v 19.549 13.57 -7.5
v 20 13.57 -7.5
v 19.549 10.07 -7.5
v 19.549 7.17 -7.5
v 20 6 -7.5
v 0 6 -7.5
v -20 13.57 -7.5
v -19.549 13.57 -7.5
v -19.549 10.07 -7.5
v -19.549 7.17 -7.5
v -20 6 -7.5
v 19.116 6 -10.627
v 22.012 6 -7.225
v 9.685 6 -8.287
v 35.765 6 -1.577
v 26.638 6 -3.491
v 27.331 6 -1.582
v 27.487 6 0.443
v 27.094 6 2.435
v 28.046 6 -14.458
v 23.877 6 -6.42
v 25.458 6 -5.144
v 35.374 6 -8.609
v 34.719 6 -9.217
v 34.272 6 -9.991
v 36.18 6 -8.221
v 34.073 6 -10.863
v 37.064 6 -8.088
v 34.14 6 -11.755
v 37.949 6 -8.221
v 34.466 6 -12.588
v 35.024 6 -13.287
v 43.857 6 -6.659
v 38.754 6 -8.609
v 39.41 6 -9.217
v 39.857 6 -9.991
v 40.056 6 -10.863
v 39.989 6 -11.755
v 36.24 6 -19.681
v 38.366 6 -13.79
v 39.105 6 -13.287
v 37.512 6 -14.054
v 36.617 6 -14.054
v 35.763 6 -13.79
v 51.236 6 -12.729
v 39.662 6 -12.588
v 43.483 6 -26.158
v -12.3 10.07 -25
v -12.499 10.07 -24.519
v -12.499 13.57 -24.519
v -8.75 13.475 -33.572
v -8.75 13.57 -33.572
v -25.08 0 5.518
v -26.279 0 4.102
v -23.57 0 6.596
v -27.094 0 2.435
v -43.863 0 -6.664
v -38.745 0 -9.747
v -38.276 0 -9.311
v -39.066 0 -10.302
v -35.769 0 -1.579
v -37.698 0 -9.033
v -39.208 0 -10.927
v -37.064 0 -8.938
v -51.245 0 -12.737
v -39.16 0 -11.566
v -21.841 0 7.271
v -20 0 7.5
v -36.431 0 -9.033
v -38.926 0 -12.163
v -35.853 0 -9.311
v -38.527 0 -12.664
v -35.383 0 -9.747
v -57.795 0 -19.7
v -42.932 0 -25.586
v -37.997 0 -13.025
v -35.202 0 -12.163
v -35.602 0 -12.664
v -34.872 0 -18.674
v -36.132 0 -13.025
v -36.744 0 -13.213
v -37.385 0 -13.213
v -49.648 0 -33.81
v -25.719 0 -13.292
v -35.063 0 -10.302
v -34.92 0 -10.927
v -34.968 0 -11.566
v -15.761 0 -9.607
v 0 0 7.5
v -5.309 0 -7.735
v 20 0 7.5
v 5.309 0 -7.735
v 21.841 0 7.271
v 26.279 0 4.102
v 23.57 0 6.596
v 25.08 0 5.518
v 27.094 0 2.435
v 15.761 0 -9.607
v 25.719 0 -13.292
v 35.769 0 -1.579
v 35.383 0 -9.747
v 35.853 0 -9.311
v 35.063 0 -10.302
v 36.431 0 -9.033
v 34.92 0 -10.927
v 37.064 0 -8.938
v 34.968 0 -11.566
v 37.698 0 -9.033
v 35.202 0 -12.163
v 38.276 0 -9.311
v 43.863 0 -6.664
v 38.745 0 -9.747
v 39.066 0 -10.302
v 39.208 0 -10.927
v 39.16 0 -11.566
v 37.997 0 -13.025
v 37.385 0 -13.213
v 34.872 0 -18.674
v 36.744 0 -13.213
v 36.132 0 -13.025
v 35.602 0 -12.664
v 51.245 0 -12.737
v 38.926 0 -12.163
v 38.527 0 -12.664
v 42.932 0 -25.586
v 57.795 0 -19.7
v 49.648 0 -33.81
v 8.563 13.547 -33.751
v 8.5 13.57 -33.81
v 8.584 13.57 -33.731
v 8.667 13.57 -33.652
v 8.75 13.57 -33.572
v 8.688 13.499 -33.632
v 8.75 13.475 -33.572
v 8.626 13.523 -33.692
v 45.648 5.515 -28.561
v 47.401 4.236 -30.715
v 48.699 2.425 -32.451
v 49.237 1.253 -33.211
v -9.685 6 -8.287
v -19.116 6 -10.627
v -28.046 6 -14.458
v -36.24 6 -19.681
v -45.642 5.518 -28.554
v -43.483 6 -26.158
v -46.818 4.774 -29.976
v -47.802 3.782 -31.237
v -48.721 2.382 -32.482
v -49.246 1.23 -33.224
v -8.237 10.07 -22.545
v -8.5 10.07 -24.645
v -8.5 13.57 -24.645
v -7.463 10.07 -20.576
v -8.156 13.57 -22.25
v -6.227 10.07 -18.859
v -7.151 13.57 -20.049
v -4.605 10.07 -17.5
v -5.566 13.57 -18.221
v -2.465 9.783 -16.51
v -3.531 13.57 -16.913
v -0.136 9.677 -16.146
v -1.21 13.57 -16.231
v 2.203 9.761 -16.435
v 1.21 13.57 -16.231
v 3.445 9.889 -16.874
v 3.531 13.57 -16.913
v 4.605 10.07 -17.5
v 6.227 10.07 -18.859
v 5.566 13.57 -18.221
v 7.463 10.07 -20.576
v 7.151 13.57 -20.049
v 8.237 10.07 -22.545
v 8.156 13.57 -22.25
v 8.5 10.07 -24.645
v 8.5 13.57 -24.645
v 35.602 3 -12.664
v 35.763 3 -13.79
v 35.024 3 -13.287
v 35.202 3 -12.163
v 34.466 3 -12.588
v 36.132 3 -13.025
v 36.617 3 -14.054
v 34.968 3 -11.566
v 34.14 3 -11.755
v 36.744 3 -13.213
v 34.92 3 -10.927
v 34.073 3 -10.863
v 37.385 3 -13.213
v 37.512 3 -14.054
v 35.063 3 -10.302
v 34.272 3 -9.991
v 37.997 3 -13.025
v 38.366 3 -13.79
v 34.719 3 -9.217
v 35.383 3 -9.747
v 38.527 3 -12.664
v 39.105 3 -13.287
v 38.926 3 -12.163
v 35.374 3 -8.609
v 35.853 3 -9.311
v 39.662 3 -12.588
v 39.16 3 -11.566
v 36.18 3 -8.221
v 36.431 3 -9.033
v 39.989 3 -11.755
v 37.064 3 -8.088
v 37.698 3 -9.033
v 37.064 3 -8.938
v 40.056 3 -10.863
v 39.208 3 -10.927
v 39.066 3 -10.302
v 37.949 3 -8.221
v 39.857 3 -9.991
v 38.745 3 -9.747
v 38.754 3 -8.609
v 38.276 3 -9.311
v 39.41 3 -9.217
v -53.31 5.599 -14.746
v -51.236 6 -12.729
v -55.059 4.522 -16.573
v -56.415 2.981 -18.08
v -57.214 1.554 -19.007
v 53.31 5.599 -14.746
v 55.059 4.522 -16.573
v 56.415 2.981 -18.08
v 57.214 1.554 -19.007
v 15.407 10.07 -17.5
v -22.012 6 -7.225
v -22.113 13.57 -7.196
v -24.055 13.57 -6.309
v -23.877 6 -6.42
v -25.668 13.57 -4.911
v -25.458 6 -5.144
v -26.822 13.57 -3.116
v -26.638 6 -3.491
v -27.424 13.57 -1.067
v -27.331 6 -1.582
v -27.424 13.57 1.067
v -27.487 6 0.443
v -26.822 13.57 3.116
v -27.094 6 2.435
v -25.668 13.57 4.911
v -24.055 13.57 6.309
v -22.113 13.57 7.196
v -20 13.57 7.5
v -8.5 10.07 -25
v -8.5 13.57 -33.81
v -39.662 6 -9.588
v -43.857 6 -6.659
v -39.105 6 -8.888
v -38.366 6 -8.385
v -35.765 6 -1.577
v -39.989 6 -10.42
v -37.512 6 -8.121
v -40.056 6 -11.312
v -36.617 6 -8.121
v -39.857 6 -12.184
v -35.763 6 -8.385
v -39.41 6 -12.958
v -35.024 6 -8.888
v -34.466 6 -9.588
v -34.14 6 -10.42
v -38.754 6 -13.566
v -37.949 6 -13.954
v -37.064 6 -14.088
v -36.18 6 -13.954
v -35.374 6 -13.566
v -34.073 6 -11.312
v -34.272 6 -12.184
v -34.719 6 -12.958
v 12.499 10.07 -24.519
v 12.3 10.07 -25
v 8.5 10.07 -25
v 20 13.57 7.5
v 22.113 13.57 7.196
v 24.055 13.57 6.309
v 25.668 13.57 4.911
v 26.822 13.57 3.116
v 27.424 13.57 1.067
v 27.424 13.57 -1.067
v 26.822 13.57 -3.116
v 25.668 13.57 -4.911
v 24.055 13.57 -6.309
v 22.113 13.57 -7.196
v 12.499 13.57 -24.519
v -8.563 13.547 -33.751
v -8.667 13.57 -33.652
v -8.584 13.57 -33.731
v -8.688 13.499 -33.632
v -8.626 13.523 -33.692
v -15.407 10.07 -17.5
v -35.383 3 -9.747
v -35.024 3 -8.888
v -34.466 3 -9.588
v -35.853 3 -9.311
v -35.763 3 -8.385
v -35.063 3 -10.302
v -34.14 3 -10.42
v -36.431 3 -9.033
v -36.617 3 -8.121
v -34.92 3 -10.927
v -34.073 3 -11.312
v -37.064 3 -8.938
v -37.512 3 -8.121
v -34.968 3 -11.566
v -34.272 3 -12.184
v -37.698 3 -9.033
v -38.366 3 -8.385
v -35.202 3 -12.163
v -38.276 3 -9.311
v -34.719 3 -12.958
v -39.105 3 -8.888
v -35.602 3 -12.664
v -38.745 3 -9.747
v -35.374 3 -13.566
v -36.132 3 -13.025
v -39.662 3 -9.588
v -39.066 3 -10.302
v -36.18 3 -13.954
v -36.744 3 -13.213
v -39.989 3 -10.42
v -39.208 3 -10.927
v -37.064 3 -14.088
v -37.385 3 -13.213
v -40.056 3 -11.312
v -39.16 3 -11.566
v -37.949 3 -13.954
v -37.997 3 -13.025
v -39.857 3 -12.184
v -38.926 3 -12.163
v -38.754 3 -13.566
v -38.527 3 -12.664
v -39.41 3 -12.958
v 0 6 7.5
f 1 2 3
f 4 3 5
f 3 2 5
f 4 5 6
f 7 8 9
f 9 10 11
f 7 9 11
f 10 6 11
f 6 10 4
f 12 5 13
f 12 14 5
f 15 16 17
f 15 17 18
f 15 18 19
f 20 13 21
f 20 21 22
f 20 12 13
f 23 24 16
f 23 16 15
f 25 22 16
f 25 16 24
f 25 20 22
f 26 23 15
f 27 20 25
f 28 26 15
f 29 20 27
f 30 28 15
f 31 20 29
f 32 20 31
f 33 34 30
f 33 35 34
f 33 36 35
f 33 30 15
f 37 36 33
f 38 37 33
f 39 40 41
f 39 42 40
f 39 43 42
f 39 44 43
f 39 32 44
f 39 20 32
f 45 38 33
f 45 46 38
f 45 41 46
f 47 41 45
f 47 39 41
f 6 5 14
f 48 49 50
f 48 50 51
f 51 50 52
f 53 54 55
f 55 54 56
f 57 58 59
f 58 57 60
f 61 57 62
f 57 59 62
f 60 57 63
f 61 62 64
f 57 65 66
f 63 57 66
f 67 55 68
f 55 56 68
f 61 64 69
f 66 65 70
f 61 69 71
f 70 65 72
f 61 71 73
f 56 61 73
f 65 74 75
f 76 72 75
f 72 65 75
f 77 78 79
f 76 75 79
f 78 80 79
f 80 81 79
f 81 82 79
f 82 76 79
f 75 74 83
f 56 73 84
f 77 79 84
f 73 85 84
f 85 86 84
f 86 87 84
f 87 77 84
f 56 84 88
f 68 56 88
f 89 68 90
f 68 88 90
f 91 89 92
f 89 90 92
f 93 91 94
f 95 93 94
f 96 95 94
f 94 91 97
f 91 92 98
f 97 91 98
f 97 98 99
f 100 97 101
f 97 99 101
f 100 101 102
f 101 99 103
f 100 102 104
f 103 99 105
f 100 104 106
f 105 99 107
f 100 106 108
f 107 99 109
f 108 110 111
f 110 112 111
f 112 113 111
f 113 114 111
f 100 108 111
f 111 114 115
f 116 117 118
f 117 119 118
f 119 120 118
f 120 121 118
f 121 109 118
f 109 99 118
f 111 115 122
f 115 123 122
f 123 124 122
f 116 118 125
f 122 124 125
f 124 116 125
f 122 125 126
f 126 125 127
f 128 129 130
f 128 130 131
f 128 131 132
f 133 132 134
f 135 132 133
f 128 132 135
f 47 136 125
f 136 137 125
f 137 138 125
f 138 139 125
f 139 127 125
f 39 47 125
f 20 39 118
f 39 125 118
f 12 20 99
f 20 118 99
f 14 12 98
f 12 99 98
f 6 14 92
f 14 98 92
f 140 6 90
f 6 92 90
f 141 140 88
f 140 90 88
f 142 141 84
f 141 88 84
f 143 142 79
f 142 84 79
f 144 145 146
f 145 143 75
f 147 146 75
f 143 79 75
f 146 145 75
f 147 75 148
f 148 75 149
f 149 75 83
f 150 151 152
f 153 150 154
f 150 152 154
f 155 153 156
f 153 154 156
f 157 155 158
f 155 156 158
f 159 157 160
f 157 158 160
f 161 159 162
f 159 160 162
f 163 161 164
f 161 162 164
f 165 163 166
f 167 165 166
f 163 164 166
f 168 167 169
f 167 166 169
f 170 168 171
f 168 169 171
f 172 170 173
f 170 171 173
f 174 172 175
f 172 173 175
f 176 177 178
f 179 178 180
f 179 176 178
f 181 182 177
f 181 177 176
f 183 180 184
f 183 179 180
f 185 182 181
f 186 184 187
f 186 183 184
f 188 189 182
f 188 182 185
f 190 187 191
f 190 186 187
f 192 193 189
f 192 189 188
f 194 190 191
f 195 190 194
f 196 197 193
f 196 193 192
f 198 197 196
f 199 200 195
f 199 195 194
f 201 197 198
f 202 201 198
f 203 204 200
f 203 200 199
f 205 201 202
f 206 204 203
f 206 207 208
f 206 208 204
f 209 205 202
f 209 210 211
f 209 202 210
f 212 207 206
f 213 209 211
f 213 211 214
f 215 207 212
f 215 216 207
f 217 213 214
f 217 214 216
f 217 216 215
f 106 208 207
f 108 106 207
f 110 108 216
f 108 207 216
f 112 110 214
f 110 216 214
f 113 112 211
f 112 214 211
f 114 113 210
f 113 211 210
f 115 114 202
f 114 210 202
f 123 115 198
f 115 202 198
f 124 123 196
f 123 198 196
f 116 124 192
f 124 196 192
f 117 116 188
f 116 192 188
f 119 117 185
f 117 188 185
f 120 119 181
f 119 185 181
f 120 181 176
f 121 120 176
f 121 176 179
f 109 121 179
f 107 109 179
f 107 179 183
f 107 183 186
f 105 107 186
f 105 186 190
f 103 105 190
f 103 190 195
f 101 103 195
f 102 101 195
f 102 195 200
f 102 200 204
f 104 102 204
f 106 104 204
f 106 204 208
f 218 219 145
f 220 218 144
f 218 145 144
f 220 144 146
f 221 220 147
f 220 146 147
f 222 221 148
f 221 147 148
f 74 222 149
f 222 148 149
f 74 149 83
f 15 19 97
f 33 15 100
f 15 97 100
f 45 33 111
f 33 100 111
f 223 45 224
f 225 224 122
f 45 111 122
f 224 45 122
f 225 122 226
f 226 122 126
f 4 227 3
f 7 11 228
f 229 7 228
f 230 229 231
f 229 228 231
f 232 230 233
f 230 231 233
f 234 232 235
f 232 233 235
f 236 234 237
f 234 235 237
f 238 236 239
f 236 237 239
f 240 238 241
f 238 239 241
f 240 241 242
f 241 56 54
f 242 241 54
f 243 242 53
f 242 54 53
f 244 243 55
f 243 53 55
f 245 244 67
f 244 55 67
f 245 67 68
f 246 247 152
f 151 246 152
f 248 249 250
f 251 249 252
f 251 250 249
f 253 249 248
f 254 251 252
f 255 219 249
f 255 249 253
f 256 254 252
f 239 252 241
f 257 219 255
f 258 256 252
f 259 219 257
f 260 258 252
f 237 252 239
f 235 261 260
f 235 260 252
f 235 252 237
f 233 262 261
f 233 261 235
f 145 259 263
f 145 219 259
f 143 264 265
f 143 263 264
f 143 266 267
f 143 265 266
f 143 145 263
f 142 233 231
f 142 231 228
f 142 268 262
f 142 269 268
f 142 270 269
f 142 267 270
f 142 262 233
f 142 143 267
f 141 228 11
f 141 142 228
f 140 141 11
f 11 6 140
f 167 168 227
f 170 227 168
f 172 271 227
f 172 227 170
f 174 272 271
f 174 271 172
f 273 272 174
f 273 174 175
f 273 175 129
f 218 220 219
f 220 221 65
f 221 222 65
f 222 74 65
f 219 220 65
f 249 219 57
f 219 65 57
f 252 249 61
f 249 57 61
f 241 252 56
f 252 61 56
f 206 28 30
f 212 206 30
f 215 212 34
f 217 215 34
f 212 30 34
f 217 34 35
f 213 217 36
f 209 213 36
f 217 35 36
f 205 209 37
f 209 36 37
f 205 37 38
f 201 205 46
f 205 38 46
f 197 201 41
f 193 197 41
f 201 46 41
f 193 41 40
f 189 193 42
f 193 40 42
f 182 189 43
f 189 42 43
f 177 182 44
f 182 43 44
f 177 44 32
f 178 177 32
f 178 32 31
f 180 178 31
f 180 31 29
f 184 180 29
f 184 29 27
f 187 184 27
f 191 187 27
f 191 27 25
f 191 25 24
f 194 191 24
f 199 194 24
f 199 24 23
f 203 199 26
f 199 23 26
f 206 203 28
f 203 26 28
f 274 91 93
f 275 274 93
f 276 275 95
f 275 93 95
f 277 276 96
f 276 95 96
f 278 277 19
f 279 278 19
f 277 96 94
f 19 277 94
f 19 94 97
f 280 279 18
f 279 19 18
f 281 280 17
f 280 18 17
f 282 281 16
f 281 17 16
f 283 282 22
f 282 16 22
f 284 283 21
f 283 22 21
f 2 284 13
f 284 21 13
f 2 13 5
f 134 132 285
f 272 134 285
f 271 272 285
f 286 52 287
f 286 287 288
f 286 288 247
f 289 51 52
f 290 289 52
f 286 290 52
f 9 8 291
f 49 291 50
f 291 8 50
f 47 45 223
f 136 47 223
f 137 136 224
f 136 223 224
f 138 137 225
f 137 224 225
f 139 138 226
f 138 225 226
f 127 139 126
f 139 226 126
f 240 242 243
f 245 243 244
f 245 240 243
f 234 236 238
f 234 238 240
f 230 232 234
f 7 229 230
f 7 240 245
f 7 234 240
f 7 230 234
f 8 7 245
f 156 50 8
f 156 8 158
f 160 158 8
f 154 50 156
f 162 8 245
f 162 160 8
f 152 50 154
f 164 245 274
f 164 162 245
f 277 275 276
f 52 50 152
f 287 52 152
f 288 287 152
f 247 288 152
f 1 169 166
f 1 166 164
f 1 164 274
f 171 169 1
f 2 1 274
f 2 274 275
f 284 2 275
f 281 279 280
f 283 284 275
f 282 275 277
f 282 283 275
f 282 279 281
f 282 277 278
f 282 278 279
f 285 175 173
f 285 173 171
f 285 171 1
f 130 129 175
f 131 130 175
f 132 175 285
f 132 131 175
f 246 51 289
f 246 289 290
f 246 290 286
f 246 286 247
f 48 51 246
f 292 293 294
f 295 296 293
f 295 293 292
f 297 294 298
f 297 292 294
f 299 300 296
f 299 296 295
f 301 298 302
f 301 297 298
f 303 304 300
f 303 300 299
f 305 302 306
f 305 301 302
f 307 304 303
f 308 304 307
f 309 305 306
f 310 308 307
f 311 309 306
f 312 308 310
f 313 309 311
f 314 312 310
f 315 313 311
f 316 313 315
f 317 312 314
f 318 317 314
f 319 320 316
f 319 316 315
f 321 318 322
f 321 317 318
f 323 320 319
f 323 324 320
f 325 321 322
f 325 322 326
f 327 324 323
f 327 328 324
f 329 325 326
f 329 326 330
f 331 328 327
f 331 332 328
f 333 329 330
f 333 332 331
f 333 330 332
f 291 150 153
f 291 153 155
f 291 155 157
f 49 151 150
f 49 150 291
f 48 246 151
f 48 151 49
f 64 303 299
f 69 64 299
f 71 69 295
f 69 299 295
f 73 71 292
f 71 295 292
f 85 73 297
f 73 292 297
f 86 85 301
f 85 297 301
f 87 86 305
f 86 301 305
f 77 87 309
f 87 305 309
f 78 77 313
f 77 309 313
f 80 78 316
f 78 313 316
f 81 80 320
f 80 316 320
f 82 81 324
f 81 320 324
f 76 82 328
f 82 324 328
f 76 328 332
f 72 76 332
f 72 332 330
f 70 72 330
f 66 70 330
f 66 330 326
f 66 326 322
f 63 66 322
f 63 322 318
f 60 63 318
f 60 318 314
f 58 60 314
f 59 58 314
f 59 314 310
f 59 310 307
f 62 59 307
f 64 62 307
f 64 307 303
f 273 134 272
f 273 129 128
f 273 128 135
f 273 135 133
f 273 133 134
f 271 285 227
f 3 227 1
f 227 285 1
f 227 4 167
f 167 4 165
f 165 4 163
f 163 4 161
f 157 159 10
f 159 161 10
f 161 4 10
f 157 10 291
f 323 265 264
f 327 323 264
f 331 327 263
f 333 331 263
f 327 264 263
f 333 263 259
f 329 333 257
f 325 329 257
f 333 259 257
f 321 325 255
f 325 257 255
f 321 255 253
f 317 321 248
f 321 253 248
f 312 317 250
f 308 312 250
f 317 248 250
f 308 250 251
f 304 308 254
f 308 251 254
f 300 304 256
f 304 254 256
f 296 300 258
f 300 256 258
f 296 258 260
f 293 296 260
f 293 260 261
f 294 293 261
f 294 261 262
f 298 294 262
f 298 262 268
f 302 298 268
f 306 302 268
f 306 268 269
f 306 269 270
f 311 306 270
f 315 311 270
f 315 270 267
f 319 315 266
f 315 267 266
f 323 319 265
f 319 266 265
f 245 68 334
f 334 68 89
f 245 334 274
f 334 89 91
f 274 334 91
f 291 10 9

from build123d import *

# Parameters (mm, degrees)
BOSS_EXTRUDE1_DEPTH      = 13.57
BOSS_EXTRUDE3_DEPTH      = 3.5
BOSS_EXTRUDE4_DEPTH      = 26
BOSS_EXTRUDE4_DEPTH_BACK = 27
CUT_EXTRUDE1_DEPTH       = 45.729836908
CUT_EXTRUDE1_DEPTH_BACK  = 45.729836908
CUT_EXTRUDE2_DEPTH       = 46.64535365
CUT_EXTRUDE2_DEPTH_BACK  = 46.64535365
BOSS_EXTRUDE5_DEPTH      = 6
FILLET1_R                = 10
SKETCH8_R                = 2.15
CUT_EXTRUDE3_DEPTH       = 68.384074457
SKETCH8_4_R              = 3
SKETCH8_4_R_2            = 2.15
CUT_EXTRUDE4_DEPTH       = 3


with BuildPart() as part:
    # Sketch1 → Boss-Extrude1 (new body)
    with BuildSketch(Plane(origin=(0, 0, 0), x_dir=(1, 0, 0), z_dir=(0, 1, 0))):
        with BuildLine():
            Line((20, 7.5), (-20, 7.5))
            ThreePointArc((-20, 7.5), (-27.5, 0), (-20, -7.5))
            Line((-20, -7.5), (20, -7.5))
            ThreePointArc((20, -7.5), (27.5, 0), (20, 7.5))
        make_face()
    extrude(amount=BOSS_EXTRUDE1_DEPTH)

    # Sketch3 → Boss-Extrude3 (add)
    with BuildSketch(Plane(origin=(0, 13.57, 0), x_dir=(-1, 0, 0), z_dir=(0, -1, 0))):
        with BuildLine():
            Line((-19.549061387, 7.5), (19.549061387, 7.5))
            Line((19.549061387, 7.5), (12.499372909, 24.519453536))
            ThreePointArc((12.499372909, 24.519453536), (0, 12.144660941), (-12.499372909, 24.519453536))
            Line((-12.499372909, 24.519453536), (-19.549061387, 7.5))
        make_face()
        with BuildLine():
            ThreePointArc((-12.499372909, 24.519453536), (0, 12.144660941), (12.499372909, 24.519453536))
            Line((12.499372909, 24.519453536), (8.749856339, 33.57158729))
            ThreePointArc((8.749856339, 33.57158729), (8.625750618, 33.691562414), (8.5, 33.809812331))
            Line((8.5, 33.809812331), (8.5, 24.644660941))
            ThreePointArc((8.5, 24.644660941), (0, 16.144660941), (-8.5, 24.644660941))
            Line((-8.5, 24.644660941), (-8.5, 33.809812331))
            ThreePointArc((-8.5, 33.809812331), (-8.625750618, 33.691562414), (-8.749856339, 33.57158729))
            Line((-8.749856339, 33.57158729), (-12.499372909, 24.519453536))
        make_face()
    extrude(amount=BOSS_EXTRUDE3_DEPTH)

    # Sketch4 → Boss-Extrude4 (add, two sides: drawn at the far end of the back side and taken through both)
    with BuildSketch(Plane(origin=(0, 0, 0), x_dir=(0, 0, -1), z_dir=(1, 0, 0)).offset(-BOSS_EXTRUDE4_DEPTH_BACK)):
        Polygon((7.5, 10.07), (7.5, 7.17), (17.5, 10.07), align=None)
    extrude(amount=BOSS_EXTRUDE4_DEPTH + BOSS_EXTRUDE4_DEPTH_BACK)

    # Sketch5 → Cut-Extrude1 (cut, two sides: drawn at the far end of the back side and taken through both)
    with BuildSketch(Plane(origin=(0, 10.07, 0), x_dir=(1, 0, 0), z_dir=(0, 1, 0)).offset(-CUT_EXTRUDE1_DEPTH_BACK)):
        Polygon((-19.549061387, 7.5), (-15.406925764, 17.5), (-27, 17.5), (-27, 7.5), (-20, 7.5), align=None)
        Polygon((15.406925764, 17.5), (19.549061387, 7.5), (20, 7.5), (26, 7.5), (26, 17.5), align=None)
        with BuildLine():
            Line((4.604760585, 17.5), (-4.604760585, 17.5))
            ThreePointArc((-4.604760585, 17.5), (0, 16.144660941), (4.604760585, 17.5))
        make_face()
    extrude(amount=CUT_EXTRUDE1_DEPTH + CUT_EXTRUDE1_DEPTH_BACK, mode=Mode.SUBTRACT)

    # Sketch6 → Cut-Extrude2 (cut, two sides: drawn at the far end of the back side and taken through both)
    with BuildSketch(Plane(origin=(0, 0, 0), x_dir=(0, 0, -1), z_dir=(1, 0, 0)).offset(-CUT_EXTRUDE2_DEPTH_BACK)):
        Polygon((32.504181683, 4.538254004), (33.809812331, 6.646903952), (33.809812331, 13.57), (25, 10.07), align=None)
    extrude(amount=CUT_EXTRUDE2_DEPTH + CUT_EXTRUDE2_DEPTH_BACK, mode=Mode.SUBTRACT)

    # Sketch7 → Boss-Extrude5 (add)
    with BuildSketch(Plane(origin=(0, 0, 0), x_dir=(1, 0, 0), z_dir=(0, 1, 0))):
        with BuildLine():
            Line((57.794508063, 19.700472411), (49.648476863, 33.809812331))
            ThreePointArc((49.648476863, 33.809812331), (0, 7.5), (-49.648476863, 33.809812331))
            Line((-49.648476863, 33.809812331), (-57.794508063, 19.700472411))
            ThreePointArc((-57.794508063, 19.700472411), (-31.93771633, -0.360019714), (-3.1e-07, -7.5))
            ThreePointArc((-3.1e-07, -7.5), (31.93771605, -0.360019846), (57.794508063, 19.700472411))
        make_face()
    extrude(amount=BOSS_EXTRUDE5_DEPTH)

    # Fillet1
    # the kernel refuses this fillet: 10 mm, written as the material it takes off along each edge
    with BuildSketch(Plane(origin=(-38.192037625, 6, -53.652947164), x_dir=(0.8660254037844376, 0, 0.5000000000000019), z_dir=(-0.5000000000000019, 0, 0.8660254037844376))) as fillet1_piece_1:
        with BuildLine():
            CenterArc((9.16515139, -10), FILLET1_R, 90, 66.421821522)
            Line((0, -6), (-0.183303028, -5.92))
            ThreePointArc((-0.183303028, -5.92), (-0.2, -3), (-0.2, 0))
            Line((-0.2, 0), (0, 0.2))
            Line((0, 0.2), (9.16515139, 0.2))
            Line((9.16515139, 0.2), (9.16515139, 0))
        make_face()
    extrude(amount=62.117819351, mode=Mode.SUBTRACT)
    with BuildSketch(Plane(origin=(69.250947301, 6, 0.142662422), x_dir=(0, -1, 0), z_dir=(-0.5000000000000019, 0, -0.8660254037844376))) as fillet1_piece_2:
        with BuildLine():
            CenterArc((10, 9.16515139), FILLET1_R, 180, 66.421821522)
            Line((0, 9.16515139), (-0.2, 9.16515139))
            Line((-0.2, 9.16515139), (-0.2, 0))
            Line((-0.2, 0), (0, -0.2))
            ThreePointArc((0, -0.2), (3, -0.2), (5.92, -0.183303028))
            Line((5.92, -0.183303028), (6, 0))
        make_face()
    extrude(amount=62.117819351, mode=Mode.SUBTRACT)

    # Sketch8 → Cut-Extrude3 (cut, through all)
    with BuildSketch(Plane(origin=(0, 6, 0), x_dir=(1, 0, 0), z_dir=(0, 1, 0))):
        with Locations(Location((37.064396977, 11.087510982, 0), (0, 0, 270))):
            Circle(SKETCH8_R)
        with Locations(Location((-37.064396977, 11.087510982, 0), (0, 0, 270))):
            Circle(SKETCH8_R)
    extrude(amount=-CUT_EXTRUDE3_DEPTH, mode=Mode.SUBTRACT)

    # Sketch8<4> → Cut-Extrude4 (cut)
    # profile 1 of 2: a face of its own
    with BuildSketch(Plane(origin=(0, 6, 0), x_dir=(1, 0, 0), z_dir=(0, 1, 0))):
        with Locations(Location((37.064396977, 11.087510982, 0), (0, 0, 270))):
            Circle(SKETCH8_4_R)
        with Locations(Location((37.064396977, 11.087510982, 0), (0, 0, 270))):
            Circle(SKETCH8_4_R_2, mode=Mode.SUBTRACT)
    # profile 2 of 2: a face of its own
    with BuildSketch(Plane(origin=(0, 6, 0), x_dir=(1, 0, 0), z_dir=(0, 1, 0))):
        with Locations(Location((-37.064396977, 11.087510982, 0), (0, 0, 90))):
            Circle(SKETCH8_4_R)
        with Locations(Location((-37.064396977, 11.087510982, 0), (0, 0, 270))):
            Circle(SKETCH8_4_R_2, mode=Mode.SUBTRACT)
    extrude(amount=-CUT_EXTRUDE4_DEPTH, mode=Mode.SUBTRACT)


solid = part.part
